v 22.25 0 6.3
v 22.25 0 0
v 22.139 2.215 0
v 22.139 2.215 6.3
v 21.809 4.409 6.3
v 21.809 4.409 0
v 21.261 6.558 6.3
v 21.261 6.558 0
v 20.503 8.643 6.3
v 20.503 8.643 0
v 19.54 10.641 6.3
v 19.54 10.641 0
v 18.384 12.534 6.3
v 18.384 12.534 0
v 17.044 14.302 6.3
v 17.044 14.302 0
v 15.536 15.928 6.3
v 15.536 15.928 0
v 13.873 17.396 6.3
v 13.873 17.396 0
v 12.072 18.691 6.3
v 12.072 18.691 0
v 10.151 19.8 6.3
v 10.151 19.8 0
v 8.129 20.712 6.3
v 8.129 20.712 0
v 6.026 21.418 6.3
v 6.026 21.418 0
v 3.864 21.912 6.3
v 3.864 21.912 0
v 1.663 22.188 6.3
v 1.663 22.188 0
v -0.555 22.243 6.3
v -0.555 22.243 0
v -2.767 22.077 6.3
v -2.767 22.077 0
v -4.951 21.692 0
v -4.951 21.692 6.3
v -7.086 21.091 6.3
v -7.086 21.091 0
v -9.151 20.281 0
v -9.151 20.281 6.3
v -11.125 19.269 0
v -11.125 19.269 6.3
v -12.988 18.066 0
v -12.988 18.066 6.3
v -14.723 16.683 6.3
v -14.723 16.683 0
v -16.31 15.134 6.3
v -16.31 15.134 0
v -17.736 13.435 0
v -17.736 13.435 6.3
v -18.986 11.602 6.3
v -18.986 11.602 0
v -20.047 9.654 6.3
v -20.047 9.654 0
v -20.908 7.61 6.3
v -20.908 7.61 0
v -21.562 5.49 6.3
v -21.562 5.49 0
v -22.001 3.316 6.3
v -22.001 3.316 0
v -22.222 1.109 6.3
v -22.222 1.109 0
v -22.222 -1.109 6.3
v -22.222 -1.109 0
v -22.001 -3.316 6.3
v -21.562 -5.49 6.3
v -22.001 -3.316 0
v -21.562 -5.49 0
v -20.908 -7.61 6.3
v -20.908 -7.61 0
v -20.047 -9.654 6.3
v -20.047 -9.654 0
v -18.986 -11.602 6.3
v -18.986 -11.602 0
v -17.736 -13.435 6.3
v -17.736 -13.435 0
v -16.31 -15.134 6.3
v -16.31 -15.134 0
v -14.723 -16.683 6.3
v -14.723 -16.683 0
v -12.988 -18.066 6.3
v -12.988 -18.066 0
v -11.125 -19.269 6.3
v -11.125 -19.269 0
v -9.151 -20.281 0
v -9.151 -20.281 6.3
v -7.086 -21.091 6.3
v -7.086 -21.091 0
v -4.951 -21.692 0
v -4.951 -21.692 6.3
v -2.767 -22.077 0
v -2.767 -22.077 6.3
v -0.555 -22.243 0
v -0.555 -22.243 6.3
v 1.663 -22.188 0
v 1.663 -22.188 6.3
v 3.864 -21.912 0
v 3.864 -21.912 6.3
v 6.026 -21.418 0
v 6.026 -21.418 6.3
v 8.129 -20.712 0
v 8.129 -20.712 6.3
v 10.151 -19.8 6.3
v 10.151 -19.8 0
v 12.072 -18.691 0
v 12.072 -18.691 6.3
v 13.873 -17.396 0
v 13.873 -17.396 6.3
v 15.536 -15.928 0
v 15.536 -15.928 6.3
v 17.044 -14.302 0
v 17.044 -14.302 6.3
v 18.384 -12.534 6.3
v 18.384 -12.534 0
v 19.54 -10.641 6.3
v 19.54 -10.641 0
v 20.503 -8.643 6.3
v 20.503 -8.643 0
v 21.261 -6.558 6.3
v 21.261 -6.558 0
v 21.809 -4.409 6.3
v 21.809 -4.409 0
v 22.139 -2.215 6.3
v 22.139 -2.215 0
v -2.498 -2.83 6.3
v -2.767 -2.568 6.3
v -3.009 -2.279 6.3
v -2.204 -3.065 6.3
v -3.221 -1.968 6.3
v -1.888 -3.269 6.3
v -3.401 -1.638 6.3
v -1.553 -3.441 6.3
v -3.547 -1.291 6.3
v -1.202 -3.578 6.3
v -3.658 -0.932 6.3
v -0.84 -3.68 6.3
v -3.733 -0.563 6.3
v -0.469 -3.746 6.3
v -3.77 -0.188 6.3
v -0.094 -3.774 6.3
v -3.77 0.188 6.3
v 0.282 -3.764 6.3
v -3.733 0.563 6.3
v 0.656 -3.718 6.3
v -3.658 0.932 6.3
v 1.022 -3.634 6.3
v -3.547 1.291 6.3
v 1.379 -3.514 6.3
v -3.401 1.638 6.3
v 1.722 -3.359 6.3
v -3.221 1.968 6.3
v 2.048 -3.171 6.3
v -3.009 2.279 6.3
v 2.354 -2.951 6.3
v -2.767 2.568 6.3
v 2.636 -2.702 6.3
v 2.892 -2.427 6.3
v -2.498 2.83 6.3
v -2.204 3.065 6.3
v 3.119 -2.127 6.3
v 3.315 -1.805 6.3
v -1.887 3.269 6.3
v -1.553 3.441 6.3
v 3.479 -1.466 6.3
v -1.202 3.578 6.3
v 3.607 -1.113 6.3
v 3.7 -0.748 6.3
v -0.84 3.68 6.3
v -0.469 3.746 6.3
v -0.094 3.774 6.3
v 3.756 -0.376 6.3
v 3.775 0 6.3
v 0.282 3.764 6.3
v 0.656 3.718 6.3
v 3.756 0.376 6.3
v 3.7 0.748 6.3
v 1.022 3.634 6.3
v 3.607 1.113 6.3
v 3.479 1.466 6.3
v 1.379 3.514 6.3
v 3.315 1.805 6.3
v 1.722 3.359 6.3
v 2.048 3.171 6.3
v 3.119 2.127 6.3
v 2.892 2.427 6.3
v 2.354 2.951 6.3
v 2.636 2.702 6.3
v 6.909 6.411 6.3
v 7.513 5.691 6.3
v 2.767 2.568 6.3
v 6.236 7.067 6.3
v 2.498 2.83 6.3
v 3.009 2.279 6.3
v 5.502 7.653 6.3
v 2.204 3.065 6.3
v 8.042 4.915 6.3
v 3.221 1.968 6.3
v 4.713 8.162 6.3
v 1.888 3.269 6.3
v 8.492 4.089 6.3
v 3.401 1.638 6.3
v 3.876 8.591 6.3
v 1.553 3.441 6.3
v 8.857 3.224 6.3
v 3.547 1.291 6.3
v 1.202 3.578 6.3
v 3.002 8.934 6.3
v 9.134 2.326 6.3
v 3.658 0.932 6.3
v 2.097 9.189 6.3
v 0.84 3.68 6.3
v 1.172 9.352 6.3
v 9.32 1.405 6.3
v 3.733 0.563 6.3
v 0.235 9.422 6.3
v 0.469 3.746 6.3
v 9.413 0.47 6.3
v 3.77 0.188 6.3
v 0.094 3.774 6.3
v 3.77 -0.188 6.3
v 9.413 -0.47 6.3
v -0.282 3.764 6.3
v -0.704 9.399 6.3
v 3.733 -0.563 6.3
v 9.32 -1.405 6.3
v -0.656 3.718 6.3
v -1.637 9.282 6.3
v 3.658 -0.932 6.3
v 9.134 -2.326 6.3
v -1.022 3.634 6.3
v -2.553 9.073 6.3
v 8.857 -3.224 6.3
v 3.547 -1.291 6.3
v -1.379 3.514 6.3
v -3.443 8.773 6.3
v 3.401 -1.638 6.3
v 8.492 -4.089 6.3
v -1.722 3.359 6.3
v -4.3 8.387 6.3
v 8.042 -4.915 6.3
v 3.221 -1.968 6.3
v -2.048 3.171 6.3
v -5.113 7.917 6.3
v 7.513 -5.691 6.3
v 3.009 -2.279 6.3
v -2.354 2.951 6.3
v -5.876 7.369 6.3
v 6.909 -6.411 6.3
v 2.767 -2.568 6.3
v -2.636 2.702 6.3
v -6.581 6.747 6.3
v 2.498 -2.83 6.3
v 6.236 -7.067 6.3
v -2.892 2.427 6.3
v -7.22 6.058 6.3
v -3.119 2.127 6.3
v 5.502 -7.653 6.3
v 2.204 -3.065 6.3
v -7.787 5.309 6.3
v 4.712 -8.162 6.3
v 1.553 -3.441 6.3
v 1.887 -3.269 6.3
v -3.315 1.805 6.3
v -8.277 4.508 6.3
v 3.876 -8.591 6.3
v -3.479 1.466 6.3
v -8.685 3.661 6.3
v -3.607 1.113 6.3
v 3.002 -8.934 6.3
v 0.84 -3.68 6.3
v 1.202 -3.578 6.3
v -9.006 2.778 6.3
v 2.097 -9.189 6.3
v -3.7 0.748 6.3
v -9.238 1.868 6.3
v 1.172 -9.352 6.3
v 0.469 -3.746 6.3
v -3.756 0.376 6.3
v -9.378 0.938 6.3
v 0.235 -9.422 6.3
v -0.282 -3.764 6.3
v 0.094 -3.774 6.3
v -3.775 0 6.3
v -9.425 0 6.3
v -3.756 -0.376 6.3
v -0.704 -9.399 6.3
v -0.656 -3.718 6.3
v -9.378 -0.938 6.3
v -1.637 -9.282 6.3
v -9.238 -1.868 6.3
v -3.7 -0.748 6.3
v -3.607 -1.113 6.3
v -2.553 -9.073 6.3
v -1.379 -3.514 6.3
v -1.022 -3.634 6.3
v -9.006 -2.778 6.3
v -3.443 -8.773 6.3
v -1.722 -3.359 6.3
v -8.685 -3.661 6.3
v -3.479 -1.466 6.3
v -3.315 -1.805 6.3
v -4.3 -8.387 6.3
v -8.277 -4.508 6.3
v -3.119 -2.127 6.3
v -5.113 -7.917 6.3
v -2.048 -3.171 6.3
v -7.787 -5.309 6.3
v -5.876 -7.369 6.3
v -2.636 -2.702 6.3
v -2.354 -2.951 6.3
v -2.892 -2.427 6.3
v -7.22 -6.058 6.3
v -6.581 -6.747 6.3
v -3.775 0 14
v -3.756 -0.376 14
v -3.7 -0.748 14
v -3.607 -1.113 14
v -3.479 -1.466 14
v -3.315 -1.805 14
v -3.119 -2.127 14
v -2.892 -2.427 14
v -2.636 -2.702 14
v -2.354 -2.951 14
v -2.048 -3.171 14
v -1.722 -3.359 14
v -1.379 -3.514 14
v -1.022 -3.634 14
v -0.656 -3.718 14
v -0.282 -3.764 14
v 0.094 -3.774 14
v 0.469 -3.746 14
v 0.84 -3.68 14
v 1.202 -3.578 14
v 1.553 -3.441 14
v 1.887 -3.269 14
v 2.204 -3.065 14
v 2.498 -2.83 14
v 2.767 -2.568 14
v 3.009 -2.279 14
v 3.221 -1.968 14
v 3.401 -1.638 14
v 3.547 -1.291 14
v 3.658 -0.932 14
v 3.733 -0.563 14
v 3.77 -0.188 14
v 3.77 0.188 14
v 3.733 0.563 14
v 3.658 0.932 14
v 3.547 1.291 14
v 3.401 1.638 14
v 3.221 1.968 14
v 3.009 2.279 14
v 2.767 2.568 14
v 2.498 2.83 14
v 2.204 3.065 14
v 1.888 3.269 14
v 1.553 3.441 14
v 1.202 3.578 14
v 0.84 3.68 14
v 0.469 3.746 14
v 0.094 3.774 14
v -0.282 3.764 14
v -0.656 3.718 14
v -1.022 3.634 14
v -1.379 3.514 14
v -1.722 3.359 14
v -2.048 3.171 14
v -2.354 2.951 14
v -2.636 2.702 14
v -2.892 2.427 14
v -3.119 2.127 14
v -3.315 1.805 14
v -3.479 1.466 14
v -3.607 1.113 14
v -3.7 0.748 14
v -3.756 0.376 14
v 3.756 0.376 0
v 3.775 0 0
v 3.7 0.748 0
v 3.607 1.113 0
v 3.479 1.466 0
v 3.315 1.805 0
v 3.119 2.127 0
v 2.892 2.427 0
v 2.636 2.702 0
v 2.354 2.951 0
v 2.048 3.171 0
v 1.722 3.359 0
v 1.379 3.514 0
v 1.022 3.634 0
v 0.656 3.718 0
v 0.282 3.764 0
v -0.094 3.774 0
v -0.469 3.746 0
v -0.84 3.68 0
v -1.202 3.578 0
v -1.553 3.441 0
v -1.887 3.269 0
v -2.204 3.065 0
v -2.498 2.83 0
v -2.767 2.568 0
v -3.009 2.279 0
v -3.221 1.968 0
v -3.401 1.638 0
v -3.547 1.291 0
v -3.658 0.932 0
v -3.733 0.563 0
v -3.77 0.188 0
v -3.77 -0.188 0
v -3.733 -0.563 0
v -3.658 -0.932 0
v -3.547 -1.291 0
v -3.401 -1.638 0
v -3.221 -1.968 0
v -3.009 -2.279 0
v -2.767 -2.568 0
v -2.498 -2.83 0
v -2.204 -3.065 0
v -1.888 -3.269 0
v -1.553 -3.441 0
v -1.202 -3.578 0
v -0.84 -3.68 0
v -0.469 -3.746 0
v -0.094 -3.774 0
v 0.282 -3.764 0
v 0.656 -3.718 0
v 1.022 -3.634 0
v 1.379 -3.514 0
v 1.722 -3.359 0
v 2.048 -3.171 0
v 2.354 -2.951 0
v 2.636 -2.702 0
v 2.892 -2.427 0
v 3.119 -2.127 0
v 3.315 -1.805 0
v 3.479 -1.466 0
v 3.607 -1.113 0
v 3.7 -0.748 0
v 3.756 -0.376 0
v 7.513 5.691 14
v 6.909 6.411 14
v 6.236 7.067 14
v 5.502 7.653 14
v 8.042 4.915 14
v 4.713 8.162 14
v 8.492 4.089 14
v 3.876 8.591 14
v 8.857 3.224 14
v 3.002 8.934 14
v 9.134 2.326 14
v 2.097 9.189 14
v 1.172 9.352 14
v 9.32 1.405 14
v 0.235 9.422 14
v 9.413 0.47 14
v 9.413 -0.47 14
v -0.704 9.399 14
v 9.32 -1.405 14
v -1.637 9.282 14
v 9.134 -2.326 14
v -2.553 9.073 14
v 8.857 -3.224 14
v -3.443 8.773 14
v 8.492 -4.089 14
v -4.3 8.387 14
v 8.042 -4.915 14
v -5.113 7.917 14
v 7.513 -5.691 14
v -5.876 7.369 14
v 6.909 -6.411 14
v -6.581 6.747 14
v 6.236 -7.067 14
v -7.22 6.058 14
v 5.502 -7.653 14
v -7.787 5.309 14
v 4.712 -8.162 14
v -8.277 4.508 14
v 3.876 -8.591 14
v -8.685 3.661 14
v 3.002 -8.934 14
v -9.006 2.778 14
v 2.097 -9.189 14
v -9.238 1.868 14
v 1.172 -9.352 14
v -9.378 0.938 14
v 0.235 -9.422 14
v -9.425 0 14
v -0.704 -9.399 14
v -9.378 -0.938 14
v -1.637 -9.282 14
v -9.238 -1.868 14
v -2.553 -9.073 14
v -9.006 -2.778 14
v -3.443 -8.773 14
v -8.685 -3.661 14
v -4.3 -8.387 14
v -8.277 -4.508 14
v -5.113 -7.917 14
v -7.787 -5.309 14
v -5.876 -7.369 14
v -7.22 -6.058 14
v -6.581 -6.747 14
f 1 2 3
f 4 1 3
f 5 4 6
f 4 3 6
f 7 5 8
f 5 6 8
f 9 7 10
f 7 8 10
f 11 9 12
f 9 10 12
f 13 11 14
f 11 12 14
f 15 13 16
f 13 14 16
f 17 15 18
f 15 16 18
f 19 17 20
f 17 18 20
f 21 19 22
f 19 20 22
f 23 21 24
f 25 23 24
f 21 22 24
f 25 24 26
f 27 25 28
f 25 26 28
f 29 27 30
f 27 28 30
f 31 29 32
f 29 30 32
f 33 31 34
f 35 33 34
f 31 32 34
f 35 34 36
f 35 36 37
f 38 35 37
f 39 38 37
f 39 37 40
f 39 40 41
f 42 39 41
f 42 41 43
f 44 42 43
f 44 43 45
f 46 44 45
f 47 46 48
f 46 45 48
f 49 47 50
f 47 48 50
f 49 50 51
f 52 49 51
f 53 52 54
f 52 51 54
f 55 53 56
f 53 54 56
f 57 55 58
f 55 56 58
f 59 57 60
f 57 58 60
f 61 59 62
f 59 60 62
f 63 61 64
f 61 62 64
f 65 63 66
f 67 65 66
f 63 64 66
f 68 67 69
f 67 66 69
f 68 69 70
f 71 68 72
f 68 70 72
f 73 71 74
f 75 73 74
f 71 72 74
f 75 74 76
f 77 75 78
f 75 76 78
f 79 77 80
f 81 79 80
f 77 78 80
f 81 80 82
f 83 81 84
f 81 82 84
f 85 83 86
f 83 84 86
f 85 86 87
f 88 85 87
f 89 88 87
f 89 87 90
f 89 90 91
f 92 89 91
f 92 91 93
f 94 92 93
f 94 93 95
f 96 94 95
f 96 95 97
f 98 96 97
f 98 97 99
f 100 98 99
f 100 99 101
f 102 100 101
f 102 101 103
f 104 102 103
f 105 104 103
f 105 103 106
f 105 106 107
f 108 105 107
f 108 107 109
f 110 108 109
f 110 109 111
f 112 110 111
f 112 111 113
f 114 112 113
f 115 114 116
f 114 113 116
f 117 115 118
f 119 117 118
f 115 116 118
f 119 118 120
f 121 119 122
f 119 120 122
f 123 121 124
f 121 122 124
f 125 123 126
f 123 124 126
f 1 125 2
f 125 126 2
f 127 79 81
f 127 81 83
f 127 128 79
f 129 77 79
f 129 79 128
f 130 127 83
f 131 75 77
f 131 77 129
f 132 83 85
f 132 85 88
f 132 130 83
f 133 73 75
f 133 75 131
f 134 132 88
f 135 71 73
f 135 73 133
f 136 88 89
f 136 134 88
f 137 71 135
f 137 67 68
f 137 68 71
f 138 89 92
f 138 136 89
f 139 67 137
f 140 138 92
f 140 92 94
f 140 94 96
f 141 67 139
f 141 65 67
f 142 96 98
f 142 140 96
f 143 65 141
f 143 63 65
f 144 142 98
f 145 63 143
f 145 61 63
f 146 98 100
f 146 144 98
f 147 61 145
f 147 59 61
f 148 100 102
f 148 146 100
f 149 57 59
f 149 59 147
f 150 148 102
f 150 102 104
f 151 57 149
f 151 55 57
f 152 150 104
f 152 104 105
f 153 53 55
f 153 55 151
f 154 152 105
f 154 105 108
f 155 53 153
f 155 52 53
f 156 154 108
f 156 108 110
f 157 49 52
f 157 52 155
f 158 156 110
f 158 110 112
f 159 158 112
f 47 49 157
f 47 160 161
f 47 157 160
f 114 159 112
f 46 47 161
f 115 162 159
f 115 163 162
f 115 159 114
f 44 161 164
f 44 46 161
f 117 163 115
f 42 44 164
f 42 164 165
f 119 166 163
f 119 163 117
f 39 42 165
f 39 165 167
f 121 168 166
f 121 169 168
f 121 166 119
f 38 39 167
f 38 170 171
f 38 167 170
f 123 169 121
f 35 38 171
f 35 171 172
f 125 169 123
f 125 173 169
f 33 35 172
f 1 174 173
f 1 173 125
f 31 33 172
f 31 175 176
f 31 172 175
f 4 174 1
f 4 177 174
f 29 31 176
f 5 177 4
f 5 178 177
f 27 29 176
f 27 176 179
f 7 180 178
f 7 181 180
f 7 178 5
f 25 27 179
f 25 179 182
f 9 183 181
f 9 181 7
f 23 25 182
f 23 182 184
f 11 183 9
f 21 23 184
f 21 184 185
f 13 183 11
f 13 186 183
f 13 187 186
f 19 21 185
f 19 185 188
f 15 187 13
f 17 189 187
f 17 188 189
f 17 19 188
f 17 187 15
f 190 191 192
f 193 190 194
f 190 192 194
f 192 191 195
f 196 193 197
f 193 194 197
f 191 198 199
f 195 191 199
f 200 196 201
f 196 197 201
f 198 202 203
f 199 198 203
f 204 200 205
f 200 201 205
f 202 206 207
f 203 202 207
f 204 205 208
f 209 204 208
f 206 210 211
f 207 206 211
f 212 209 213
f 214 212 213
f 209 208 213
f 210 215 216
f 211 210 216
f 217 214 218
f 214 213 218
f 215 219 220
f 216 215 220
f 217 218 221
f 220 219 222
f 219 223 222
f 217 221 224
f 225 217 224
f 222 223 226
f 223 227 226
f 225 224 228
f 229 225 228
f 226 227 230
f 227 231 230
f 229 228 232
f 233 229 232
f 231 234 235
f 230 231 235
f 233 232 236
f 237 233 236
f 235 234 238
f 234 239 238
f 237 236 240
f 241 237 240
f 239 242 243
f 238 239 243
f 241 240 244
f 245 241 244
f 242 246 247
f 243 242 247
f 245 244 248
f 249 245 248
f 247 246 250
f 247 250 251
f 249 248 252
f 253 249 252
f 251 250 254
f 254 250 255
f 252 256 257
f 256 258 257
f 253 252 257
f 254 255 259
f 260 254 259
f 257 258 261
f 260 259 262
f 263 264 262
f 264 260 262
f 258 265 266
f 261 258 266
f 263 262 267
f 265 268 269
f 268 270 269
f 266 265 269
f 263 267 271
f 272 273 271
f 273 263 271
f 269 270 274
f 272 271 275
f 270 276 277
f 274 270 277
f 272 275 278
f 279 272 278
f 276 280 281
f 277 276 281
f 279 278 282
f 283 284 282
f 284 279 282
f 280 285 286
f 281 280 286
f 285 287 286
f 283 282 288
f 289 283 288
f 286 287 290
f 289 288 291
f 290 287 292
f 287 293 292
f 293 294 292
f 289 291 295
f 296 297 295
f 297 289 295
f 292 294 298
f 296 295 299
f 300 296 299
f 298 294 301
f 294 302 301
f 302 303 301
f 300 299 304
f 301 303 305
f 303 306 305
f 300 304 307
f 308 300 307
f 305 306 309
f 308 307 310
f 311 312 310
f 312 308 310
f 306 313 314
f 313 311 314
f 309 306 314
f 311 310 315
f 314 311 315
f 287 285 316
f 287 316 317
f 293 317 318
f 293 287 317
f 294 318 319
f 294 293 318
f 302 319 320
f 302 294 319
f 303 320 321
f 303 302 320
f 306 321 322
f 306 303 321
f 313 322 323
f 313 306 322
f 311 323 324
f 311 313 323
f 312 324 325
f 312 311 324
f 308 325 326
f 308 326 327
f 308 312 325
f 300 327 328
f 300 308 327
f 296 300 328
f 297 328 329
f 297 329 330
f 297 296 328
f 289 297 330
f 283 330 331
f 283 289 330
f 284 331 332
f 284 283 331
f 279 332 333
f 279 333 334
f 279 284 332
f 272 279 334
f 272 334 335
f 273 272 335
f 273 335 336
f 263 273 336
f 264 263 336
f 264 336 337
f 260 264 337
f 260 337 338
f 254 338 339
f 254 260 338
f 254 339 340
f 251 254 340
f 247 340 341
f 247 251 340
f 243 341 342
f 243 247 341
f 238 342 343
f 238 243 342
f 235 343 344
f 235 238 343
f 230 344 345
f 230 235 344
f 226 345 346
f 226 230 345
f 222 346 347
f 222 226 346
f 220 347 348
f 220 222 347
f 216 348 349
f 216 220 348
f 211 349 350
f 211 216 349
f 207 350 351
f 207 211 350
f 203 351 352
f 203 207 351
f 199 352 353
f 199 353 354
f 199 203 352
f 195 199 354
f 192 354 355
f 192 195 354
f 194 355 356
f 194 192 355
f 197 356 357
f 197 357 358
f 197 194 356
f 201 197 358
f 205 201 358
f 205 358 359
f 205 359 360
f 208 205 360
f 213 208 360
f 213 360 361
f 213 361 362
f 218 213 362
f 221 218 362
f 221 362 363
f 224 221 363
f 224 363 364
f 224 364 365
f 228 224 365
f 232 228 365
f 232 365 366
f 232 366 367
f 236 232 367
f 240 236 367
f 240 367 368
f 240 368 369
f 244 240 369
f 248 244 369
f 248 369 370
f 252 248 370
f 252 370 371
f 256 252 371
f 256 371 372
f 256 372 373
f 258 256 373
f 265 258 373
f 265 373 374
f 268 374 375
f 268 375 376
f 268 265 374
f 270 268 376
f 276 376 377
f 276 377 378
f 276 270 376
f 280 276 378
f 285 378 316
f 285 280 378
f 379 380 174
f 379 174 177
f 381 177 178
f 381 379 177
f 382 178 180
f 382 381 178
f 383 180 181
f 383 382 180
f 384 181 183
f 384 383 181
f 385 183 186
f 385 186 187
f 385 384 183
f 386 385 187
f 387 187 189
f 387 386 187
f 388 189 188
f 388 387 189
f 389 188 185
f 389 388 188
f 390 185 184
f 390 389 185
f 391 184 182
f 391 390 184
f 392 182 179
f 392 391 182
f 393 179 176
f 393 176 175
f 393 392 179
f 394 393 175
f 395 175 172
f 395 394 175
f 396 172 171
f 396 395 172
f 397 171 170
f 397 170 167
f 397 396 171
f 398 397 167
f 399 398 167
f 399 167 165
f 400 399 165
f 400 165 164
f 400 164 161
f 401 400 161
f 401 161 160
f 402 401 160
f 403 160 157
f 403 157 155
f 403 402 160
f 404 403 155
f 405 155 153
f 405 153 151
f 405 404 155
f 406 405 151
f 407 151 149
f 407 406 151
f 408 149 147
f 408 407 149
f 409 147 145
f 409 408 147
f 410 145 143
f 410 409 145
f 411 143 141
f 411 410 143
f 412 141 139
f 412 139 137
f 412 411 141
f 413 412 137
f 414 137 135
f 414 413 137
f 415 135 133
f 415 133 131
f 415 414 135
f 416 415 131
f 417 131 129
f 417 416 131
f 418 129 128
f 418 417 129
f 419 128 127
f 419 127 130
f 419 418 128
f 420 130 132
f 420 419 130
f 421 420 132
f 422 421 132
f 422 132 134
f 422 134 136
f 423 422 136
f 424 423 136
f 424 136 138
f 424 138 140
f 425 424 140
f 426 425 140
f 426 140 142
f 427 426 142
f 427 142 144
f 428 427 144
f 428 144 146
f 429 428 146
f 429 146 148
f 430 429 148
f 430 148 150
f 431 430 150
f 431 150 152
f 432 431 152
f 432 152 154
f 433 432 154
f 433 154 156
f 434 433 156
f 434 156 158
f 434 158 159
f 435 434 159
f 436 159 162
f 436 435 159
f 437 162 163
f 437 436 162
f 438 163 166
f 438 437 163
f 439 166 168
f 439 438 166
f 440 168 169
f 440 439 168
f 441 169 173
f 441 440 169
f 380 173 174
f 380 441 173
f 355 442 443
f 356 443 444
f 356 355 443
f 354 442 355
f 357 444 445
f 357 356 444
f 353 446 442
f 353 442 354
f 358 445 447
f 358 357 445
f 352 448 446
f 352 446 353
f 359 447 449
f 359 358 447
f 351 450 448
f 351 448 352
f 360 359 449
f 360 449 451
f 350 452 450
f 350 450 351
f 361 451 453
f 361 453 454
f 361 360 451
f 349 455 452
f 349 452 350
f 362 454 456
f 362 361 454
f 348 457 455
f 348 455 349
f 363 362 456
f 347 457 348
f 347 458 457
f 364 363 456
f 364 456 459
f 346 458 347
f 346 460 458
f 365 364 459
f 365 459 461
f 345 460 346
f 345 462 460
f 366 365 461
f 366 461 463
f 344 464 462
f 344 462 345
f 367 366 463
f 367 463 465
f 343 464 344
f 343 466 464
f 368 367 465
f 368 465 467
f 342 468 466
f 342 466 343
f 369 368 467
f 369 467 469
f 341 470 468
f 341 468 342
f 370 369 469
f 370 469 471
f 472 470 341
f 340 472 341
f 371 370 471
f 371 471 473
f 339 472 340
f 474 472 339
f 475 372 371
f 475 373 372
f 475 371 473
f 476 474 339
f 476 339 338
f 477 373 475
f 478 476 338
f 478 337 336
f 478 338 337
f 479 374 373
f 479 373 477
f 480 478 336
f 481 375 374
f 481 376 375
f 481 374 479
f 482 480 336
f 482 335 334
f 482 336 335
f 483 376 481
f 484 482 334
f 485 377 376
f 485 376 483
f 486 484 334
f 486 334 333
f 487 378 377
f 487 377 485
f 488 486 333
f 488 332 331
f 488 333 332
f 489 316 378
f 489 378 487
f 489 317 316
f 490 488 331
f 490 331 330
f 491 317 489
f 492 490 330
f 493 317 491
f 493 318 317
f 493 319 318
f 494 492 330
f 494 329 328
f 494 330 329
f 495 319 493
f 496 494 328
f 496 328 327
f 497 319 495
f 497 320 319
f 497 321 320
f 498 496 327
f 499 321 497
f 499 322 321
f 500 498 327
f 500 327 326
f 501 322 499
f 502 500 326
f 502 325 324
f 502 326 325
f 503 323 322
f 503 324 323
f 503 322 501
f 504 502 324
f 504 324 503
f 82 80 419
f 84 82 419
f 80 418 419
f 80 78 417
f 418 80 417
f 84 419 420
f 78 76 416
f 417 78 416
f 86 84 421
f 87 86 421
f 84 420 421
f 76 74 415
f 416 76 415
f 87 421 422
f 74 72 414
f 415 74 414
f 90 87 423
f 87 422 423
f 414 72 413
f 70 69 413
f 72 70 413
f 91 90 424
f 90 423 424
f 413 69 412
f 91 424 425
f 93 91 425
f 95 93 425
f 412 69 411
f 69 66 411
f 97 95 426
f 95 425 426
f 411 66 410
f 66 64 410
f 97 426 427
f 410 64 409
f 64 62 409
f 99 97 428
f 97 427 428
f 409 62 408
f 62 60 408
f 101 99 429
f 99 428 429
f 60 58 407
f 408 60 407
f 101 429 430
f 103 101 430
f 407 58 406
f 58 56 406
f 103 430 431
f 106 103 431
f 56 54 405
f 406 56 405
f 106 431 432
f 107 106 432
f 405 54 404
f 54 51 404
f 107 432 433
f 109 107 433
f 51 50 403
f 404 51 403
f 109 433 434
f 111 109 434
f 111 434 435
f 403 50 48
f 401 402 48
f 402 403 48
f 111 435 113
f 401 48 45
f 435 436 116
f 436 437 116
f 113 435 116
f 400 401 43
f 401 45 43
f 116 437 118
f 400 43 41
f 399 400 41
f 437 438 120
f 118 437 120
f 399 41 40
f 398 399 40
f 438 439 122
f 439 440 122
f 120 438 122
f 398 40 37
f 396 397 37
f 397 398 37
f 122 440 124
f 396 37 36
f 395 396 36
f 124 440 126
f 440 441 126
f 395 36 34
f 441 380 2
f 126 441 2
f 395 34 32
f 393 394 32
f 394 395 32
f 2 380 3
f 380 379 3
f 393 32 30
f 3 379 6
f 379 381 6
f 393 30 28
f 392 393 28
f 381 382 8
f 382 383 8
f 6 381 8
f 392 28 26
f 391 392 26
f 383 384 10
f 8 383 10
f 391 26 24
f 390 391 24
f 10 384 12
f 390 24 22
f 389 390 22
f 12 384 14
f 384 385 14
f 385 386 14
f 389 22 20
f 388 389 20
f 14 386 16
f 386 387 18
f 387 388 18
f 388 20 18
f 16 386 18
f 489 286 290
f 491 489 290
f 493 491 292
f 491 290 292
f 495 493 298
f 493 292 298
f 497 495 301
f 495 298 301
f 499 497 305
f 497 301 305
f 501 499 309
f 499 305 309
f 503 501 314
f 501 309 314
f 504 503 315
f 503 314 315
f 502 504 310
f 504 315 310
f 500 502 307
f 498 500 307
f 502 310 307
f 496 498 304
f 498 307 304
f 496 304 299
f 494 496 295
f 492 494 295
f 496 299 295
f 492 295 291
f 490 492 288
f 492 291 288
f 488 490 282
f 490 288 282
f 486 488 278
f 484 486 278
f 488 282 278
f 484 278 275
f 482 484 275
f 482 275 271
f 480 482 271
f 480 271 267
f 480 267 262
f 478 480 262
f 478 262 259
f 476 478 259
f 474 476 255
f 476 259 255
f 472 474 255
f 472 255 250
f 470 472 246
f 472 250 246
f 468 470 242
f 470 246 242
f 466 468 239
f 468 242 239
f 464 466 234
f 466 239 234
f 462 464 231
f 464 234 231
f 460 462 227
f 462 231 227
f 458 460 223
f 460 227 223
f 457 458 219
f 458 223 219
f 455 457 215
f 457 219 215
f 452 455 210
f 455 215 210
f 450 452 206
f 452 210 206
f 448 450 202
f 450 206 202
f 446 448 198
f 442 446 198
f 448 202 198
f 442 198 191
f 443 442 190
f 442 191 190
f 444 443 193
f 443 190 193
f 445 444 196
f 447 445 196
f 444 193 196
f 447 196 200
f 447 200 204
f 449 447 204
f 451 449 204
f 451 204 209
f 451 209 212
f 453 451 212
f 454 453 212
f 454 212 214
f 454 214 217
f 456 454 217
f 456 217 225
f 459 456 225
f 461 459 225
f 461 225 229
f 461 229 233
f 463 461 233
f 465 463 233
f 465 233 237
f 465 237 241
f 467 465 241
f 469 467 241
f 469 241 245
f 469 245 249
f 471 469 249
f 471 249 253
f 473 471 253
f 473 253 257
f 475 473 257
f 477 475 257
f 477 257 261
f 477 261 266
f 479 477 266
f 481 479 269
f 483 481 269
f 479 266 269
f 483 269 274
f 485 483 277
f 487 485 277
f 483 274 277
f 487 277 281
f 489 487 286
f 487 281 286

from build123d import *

# Parameters (mm, degrees)
SKETCH1_R           = 22.25
SKETCH1_R_2         = 3.775
BOSS_EXTRUDE1_DEPTH = 6.3
SKETCH2_R           = 9.425
SKETCH2_R_2         = 3.775
BOSS_EXTRUDE2_DEPTH = 7.7


with BuildPart() as part:
    # Sketch1 → Boss-Extrude1 (new body)
    with BuildSketch(Plane.XY):
        Circle(SKETCH1_R)
        Circle(SKETCH1_R_2, mode=Mode.SUBTRACT)
    extrude(amount=BOSS_EXTRUDE1_DEPTH)


with BuildPart() as body_2:
    # Sketch2 → Boss-Extrude2 (new body)
    with BuildSketch(Plane.XY.offset(6.3)):
        Circle(SKETCH2_R)
        Circle(SKETCH2_R_2, mode=Mode.SUBTRACT)
    extrude(amount=BOSS_EXTRUDE2_DEPTH)


solid = Compound([part.part, body_2.part])
